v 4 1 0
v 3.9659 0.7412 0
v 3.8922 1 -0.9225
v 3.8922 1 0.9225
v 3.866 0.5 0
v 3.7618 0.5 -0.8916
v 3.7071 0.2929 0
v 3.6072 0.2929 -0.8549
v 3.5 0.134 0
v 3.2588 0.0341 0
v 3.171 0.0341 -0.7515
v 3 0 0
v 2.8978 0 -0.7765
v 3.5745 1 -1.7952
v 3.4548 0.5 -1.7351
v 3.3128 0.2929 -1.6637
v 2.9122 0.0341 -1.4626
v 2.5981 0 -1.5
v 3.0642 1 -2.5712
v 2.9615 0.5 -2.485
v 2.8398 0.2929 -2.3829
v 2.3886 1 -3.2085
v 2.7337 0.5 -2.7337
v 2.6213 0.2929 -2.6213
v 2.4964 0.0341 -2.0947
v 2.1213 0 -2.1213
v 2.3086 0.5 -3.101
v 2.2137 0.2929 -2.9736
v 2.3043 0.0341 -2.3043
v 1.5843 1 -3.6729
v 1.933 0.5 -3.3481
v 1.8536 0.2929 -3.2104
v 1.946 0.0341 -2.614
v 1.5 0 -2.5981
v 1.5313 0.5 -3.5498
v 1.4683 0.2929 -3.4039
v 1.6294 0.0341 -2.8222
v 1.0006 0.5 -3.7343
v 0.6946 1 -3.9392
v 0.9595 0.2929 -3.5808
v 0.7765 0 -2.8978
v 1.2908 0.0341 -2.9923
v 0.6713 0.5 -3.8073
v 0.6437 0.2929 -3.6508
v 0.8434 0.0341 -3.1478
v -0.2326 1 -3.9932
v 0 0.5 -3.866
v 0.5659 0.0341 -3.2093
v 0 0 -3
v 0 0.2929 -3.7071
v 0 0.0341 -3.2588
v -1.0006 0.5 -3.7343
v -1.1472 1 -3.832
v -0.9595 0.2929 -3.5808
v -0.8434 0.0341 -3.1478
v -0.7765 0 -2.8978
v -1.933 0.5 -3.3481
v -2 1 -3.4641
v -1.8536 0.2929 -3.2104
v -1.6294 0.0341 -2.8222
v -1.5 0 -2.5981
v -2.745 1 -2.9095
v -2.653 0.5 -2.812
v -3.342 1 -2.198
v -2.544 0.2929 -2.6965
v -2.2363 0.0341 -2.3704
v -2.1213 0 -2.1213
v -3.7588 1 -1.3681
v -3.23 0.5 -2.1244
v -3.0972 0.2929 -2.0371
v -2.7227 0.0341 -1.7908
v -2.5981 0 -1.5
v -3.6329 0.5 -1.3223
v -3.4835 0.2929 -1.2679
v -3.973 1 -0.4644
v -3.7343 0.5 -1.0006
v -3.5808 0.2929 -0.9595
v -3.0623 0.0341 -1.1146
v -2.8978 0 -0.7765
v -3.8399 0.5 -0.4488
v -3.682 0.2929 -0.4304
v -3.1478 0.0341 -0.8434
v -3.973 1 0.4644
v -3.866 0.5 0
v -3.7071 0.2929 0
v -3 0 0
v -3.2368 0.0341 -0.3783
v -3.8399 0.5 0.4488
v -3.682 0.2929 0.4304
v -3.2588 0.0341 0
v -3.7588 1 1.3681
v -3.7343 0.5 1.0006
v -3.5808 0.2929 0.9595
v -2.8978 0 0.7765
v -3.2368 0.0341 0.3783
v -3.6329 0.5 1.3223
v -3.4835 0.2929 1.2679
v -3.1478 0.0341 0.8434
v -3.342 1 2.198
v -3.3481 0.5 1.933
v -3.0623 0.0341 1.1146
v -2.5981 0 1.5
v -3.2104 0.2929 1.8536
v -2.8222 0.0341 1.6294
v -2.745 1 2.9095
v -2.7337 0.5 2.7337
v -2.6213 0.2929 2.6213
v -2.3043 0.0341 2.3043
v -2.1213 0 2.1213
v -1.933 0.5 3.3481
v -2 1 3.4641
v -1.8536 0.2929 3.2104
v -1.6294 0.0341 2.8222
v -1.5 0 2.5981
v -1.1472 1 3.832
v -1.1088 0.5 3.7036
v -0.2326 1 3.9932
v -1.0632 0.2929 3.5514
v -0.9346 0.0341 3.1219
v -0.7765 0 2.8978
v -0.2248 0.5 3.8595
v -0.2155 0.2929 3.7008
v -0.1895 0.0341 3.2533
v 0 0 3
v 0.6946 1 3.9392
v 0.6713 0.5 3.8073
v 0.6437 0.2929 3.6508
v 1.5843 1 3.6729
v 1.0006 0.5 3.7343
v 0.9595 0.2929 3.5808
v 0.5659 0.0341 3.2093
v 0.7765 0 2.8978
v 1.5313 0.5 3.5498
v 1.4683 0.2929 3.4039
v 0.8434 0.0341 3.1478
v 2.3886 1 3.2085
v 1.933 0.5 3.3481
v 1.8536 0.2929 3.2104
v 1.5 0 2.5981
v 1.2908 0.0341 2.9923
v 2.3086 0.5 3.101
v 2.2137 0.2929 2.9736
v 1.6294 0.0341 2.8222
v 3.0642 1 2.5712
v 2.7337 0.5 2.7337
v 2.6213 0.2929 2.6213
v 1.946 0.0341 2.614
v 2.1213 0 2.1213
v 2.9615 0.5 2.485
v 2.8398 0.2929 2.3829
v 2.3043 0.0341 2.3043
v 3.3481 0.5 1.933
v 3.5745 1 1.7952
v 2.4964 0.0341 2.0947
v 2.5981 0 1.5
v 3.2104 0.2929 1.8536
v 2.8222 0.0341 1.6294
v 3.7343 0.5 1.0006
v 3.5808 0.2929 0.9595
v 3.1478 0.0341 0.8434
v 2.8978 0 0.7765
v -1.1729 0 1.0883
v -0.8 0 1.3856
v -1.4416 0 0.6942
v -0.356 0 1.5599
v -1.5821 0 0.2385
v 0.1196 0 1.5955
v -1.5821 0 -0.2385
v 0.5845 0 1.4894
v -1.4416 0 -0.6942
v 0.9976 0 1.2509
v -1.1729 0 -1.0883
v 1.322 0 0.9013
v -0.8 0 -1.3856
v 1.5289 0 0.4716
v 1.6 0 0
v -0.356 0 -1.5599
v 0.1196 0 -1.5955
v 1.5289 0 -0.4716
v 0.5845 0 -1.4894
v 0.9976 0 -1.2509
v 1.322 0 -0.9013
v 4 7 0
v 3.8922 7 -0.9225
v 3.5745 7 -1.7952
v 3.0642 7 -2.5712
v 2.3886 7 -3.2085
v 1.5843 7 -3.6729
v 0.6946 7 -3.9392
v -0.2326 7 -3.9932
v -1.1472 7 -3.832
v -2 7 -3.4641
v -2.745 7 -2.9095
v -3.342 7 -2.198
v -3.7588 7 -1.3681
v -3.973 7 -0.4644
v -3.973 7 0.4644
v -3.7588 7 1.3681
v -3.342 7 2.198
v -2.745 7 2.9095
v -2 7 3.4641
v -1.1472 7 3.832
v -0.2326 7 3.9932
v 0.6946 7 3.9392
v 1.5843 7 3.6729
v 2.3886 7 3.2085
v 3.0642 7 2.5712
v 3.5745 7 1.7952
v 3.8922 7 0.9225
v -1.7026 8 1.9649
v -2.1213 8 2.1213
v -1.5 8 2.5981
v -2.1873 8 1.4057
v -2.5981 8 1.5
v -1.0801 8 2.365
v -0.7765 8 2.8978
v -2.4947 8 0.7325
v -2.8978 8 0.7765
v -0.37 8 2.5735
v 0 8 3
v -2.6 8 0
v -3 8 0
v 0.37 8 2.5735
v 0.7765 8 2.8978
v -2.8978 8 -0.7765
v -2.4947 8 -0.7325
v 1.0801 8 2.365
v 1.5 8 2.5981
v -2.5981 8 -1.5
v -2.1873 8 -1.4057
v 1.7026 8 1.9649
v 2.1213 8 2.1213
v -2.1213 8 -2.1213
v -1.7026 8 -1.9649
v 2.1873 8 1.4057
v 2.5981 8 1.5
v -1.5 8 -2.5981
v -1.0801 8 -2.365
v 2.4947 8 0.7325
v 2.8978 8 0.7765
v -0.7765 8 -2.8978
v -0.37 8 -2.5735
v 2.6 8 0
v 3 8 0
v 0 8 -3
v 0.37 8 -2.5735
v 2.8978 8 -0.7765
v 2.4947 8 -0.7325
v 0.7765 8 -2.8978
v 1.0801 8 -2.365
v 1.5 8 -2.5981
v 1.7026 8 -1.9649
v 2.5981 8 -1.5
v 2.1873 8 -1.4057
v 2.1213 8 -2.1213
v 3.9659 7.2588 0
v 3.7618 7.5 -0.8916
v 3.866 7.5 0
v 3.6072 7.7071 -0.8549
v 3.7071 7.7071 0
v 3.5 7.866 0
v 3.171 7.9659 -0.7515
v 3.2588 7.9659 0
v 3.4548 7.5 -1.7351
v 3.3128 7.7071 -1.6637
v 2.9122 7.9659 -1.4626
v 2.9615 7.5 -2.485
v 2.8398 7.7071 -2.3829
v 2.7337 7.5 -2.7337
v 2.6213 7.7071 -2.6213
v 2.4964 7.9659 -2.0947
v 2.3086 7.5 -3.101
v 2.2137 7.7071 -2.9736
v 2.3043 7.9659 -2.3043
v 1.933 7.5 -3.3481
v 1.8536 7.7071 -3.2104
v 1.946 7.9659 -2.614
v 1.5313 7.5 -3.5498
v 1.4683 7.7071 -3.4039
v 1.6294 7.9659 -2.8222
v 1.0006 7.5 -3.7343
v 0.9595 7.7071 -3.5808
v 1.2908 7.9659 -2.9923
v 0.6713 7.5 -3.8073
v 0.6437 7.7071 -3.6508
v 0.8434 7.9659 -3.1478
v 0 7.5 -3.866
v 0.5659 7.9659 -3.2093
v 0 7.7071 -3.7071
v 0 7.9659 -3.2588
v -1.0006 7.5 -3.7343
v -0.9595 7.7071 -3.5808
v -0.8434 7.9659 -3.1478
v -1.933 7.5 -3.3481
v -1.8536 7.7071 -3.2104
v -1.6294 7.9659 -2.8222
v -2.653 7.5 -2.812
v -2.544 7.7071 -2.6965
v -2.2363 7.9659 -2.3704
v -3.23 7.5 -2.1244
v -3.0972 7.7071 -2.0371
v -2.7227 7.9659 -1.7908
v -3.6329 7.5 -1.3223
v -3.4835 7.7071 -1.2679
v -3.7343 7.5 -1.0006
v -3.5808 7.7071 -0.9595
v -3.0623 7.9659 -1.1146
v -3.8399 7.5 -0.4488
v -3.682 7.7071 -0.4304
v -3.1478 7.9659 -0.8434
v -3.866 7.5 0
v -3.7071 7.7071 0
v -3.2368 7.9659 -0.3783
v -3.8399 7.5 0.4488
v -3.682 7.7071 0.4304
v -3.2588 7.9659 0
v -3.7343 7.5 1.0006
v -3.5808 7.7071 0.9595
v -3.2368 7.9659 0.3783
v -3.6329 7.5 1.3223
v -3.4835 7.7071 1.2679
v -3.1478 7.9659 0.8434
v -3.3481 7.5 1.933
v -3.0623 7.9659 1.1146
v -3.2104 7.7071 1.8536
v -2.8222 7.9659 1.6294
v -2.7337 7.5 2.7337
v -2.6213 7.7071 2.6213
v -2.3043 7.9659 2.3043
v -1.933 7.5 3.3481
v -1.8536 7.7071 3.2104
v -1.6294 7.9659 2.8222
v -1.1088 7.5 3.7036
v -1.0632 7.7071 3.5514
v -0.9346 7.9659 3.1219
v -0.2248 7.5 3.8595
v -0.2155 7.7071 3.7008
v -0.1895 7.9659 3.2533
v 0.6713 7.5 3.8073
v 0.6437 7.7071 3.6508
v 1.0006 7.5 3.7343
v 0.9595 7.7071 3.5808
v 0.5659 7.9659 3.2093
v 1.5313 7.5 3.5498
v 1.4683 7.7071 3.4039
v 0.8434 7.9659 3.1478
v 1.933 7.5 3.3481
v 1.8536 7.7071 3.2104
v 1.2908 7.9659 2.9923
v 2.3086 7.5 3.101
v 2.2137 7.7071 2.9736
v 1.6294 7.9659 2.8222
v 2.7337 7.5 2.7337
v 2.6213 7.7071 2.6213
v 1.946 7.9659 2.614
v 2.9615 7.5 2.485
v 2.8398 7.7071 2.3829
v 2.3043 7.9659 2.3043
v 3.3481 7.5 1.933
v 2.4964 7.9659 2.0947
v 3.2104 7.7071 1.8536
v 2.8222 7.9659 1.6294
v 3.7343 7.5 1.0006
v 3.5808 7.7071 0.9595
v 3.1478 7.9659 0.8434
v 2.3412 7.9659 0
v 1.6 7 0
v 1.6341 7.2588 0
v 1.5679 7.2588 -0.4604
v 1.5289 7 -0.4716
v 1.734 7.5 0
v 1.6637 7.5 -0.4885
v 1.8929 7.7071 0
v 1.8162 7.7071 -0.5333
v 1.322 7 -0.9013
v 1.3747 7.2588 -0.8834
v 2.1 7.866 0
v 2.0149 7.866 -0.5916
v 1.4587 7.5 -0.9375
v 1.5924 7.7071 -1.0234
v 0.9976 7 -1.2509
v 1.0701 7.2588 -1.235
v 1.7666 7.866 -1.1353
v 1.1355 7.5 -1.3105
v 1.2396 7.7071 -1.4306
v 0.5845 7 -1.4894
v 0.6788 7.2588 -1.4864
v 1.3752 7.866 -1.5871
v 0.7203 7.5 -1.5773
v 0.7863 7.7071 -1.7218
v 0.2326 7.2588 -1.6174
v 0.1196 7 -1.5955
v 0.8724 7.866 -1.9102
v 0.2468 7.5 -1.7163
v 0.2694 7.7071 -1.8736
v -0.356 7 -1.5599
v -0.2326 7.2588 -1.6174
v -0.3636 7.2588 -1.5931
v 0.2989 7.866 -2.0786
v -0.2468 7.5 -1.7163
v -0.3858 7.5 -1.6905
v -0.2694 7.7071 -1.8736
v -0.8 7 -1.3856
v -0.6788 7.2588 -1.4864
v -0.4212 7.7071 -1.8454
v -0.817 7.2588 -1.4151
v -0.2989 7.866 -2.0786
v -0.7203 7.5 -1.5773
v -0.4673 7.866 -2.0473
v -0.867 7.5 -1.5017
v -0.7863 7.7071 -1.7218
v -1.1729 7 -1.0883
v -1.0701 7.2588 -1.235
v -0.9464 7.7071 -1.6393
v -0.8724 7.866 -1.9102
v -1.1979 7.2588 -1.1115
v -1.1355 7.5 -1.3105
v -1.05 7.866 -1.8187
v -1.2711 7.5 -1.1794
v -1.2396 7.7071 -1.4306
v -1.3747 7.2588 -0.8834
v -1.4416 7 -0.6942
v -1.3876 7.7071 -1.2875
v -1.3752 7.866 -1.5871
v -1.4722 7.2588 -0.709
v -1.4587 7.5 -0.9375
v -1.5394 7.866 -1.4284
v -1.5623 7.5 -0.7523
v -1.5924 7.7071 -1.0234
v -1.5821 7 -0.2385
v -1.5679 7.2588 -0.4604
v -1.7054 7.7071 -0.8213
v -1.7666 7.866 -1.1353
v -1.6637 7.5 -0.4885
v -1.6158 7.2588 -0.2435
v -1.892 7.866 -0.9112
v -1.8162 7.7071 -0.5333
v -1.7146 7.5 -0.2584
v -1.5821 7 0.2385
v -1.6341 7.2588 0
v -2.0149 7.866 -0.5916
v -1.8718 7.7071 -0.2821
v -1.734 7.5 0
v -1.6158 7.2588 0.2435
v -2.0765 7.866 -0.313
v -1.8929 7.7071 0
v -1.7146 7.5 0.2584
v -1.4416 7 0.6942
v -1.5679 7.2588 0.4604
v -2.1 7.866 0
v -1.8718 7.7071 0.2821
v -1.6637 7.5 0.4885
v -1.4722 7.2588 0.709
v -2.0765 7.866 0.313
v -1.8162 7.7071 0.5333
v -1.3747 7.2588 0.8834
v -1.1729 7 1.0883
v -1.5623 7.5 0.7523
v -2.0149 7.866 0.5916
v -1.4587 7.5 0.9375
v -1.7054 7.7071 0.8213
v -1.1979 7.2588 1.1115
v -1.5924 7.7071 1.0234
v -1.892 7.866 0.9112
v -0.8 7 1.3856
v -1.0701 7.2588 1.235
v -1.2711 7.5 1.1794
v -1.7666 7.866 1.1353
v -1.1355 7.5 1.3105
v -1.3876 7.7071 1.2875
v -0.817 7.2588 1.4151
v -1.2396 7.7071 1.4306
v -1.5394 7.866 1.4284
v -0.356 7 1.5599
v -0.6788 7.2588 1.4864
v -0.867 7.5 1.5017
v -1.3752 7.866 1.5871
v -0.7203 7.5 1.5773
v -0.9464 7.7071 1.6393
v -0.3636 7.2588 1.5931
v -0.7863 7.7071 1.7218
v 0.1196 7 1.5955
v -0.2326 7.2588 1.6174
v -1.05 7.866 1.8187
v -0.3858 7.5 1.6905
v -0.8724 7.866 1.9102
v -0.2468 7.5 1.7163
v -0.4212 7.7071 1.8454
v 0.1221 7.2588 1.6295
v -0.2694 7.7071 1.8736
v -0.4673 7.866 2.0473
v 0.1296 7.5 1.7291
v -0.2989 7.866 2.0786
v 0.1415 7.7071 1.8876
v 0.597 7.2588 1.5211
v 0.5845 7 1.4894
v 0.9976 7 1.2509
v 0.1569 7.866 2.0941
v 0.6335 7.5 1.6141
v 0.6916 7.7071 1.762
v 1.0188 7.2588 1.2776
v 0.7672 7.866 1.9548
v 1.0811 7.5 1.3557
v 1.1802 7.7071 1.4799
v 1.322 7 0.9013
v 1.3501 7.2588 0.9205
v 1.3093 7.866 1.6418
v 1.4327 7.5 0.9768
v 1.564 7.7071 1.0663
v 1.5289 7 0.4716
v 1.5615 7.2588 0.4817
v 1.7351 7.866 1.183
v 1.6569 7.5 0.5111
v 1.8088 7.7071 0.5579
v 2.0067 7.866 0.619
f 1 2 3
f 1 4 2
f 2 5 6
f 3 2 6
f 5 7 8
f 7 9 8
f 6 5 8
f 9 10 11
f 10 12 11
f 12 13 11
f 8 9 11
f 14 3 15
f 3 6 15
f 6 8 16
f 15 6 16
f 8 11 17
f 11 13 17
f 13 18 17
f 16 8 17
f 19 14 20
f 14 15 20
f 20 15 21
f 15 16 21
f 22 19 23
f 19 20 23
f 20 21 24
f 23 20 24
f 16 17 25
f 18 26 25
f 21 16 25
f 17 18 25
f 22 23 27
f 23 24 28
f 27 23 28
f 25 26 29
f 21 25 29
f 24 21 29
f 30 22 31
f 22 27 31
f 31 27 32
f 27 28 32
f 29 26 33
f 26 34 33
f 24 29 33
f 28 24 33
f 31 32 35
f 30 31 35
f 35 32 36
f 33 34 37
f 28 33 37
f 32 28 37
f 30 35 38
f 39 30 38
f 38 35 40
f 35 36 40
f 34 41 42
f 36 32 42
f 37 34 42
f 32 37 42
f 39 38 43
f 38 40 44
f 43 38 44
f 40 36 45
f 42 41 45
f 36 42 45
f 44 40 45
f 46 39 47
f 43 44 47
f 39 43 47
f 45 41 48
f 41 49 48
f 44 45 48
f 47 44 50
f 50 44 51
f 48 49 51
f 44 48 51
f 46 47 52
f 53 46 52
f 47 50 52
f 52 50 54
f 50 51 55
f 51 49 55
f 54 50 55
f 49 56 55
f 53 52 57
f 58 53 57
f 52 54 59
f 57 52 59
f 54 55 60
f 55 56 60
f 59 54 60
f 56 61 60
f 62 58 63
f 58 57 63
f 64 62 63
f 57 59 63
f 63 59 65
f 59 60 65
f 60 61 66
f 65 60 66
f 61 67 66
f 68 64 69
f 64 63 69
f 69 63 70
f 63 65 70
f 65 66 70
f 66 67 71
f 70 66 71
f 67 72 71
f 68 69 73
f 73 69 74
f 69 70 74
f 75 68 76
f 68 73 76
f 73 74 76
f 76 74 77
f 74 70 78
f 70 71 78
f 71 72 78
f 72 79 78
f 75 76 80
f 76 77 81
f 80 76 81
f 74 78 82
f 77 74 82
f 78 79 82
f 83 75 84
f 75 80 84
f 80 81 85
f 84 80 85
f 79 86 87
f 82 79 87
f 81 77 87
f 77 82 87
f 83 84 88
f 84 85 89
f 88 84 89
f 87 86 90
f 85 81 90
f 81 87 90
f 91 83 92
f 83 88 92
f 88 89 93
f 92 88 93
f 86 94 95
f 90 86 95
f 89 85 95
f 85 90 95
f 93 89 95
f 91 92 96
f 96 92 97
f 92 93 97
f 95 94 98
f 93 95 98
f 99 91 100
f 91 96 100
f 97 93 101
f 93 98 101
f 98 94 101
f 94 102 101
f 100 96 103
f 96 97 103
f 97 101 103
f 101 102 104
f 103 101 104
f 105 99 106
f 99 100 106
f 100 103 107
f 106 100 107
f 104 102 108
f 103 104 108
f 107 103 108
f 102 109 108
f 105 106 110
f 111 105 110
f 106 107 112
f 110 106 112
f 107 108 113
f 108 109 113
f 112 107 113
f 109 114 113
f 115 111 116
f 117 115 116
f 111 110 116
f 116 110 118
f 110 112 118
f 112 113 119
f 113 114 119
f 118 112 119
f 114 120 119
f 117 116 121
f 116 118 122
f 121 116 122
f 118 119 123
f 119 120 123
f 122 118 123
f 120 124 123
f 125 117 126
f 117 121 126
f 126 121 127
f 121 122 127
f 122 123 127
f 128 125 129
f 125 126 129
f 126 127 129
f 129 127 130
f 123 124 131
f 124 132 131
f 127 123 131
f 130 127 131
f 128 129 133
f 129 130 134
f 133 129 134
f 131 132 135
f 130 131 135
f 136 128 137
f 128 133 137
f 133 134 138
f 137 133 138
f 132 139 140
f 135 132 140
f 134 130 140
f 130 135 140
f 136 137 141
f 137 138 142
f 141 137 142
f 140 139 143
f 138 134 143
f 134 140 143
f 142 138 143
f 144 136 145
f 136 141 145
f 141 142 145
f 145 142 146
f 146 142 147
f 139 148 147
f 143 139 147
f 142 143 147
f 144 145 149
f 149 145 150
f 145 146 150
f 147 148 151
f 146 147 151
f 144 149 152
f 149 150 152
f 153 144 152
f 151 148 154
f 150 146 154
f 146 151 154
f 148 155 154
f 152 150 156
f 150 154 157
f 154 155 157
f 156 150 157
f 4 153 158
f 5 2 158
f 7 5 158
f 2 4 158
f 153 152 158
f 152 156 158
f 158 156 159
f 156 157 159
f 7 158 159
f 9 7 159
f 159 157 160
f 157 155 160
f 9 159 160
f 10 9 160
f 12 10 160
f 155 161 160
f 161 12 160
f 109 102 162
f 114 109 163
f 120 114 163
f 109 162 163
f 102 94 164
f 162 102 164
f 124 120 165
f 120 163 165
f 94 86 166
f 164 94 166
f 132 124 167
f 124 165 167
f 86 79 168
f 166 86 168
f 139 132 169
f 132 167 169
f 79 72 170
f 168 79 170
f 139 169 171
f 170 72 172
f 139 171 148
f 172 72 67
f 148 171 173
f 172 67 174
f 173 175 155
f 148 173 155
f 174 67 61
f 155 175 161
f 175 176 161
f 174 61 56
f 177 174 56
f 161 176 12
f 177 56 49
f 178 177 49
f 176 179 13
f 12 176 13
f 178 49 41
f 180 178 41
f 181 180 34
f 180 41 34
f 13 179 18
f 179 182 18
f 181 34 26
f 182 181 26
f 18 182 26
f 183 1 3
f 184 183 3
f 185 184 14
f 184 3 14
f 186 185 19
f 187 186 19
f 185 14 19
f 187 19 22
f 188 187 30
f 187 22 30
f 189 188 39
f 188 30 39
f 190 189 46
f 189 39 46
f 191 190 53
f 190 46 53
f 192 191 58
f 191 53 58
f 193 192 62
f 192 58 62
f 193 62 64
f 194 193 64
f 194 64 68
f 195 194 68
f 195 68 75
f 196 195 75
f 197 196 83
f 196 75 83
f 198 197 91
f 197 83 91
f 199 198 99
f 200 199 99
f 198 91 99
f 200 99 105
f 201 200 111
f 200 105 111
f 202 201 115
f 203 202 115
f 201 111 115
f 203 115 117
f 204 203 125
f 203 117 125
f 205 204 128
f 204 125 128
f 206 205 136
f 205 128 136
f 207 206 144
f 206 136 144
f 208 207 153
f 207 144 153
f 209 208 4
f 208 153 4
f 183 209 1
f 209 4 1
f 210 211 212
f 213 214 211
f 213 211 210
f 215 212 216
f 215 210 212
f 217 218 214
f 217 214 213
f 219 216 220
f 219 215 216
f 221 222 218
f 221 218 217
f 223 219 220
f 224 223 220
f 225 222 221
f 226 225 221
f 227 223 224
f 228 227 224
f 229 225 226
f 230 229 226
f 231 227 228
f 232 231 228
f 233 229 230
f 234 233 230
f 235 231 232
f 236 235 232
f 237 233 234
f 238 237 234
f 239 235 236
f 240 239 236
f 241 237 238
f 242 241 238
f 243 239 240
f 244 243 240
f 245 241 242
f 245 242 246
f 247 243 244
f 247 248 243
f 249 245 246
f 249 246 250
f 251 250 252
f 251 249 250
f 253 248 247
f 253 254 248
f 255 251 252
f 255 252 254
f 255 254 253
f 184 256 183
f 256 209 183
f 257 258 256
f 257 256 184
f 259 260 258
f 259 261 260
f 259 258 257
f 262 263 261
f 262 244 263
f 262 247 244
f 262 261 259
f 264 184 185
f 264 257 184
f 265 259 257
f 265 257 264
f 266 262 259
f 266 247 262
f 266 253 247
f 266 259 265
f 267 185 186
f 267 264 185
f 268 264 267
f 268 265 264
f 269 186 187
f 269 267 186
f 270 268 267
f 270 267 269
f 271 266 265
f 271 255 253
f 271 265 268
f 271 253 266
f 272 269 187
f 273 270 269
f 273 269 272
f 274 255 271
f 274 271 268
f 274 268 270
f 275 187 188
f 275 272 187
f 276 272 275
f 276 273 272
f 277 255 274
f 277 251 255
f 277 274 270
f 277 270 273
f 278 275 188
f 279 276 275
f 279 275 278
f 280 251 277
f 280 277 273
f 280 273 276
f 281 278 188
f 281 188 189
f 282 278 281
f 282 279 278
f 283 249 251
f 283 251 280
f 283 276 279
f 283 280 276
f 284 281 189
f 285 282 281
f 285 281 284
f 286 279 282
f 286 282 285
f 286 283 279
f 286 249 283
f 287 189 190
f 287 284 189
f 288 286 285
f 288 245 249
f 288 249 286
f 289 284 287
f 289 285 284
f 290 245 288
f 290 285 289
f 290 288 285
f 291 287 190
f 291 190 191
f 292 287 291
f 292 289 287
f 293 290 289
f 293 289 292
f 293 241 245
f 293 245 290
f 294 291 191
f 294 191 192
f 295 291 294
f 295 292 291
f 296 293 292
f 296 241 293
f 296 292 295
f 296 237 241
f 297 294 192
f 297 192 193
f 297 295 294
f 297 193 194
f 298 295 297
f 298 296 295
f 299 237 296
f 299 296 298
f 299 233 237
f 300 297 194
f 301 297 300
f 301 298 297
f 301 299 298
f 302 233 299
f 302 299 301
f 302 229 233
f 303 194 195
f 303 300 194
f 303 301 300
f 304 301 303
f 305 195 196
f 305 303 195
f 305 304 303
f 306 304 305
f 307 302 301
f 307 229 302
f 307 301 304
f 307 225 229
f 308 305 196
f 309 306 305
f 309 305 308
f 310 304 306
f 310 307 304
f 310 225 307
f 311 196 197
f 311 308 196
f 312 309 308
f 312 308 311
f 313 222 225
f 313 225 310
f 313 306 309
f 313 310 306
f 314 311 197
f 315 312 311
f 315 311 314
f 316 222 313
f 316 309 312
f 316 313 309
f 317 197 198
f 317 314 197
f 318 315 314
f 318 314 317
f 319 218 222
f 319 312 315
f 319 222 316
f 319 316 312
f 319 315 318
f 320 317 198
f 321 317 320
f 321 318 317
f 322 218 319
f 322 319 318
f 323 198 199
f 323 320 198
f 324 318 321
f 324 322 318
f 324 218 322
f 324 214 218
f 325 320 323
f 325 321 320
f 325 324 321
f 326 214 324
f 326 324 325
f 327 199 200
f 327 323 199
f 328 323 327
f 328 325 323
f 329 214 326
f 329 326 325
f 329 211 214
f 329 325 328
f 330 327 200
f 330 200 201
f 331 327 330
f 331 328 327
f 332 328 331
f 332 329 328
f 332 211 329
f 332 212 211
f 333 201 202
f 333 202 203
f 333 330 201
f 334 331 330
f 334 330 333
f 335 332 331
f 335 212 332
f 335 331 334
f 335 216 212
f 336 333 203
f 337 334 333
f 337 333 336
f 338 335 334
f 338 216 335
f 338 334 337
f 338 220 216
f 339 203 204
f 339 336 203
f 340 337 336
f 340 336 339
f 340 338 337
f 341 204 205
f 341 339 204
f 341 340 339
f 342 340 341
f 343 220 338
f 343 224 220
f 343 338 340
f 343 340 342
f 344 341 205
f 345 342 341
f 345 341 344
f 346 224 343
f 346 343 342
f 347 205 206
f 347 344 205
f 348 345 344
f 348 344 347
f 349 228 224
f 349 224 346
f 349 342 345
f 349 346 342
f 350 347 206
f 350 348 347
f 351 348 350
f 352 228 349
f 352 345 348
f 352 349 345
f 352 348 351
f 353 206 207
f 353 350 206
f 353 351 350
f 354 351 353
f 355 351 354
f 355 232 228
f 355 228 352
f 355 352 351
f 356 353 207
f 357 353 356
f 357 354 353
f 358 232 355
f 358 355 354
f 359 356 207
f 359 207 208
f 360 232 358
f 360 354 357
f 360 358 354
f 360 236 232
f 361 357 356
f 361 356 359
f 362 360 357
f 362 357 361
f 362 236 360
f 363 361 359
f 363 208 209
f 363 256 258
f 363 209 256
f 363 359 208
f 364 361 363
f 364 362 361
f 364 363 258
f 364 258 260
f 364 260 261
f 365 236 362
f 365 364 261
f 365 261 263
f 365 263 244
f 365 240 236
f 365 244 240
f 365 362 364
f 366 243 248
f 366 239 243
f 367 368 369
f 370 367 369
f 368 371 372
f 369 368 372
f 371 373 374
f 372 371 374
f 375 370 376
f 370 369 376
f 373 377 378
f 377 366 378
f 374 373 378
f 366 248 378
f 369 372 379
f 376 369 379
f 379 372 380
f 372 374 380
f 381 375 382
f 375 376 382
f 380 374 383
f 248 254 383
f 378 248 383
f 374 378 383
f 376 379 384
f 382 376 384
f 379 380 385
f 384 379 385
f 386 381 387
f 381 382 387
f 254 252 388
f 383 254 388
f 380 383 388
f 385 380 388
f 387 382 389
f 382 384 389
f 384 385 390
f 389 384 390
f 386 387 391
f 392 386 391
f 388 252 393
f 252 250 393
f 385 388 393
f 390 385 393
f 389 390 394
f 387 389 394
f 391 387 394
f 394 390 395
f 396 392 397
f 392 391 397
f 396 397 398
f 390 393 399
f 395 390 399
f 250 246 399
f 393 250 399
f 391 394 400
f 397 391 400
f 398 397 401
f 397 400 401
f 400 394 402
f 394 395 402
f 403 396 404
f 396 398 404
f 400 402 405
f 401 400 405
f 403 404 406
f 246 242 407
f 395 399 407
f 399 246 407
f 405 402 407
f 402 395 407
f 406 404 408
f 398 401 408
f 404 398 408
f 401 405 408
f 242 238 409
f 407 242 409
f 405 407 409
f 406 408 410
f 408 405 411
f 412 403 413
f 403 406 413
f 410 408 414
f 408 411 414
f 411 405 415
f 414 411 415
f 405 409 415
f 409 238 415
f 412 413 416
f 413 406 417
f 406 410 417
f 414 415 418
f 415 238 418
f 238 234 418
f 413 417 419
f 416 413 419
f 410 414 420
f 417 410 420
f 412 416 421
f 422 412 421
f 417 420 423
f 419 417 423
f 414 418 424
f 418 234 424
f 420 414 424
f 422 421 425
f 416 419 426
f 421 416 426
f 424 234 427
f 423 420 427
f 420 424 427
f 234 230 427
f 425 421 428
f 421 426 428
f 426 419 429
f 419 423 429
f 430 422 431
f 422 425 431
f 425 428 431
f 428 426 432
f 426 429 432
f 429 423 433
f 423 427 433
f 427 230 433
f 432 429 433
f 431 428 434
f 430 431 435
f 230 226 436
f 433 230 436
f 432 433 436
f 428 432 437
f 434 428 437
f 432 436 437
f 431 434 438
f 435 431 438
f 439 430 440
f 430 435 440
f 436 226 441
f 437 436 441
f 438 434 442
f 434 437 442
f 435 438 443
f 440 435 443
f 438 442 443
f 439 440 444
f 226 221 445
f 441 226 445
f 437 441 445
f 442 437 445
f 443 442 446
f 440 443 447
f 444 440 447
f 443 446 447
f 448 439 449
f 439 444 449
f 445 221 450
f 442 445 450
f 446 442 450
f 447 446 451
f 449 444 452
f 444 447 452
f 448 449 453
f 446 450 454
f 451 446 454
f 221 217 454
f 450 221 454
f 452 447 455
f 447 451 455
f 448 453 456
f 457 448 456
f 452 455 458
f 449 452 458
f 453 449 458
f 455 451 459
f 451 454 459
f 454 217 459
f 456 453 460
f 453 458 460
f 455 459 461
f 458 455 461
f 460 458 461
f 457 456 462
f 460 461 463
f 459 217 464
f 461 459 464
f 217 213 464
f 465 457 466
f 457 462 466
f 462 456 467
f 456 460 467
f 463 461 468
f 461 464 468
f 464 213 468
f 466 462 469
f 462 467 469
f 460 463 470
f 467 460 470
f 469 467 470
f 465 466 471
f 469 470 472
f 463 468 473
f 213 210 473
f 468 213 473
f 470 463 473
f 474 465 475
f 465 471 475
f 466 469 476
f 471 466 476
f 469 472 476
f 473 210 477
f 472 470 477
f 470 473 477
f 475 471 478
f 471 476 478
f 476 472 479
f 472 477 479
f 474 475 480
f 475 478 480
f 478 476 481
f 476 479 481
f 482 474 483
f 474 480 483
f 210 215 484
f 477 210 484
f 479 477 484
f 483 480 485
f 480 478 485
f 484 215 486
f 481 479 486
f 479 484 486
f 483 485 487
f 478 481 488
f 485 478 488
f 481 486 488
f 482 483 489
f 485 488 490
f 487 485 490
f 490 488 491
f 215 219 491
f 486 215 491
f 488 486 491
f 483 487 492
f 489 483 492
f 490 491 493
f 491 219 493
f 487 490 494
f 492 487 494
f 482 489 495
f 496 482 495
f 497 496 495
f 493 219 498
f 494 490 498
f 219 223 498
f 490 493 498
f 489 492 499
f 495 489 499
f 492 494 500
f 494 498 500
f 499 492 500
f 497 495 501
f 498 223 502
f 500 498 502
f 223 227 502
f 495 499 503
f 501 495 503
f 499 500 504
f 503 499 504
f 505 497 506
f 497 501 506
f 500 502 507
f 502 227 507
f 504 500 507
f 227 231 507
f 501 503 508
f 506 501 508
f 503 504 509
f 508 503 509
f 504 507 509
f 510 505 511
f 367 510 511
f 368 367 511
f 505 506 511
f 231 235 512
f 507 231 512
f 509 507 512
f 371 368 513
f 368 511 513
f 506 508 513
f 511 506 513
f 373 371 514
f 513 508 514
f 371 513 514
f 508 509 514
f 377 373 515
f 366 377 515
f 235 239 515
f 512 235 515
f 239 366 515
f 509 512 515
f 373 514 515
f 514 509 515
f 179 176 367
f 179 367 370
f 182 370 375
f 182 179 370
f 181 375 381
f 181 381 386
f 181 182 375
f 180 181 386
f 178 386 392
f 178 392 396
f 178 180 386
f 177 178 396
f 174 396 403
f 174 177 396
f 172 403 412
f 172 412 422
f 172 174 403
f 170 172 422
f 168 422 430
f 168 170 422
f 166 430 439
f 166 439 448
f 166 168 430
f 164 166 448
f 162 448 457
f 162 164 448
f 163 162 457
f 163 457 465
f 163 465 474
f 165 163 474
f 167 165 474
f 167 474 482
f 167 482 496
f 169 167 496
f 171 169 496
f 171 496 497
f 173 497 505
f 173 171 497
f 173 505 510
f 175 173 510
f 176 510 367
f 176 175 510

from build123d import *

# Parameters (mm, degrees)
SKETCH1_R           = 4
SKETCH1_R_2         = 1.6
BOSS_EXTRUDE1_DEPTH = 8
FILLET1_R           = 1


with BuildPart() as part:
    # Sketch1 → Boss-Extrude1 (new body)
    with BuildSketch(Plane(origin=(0, 0, 0), x_dir=(1, 0, 0), z_dir=(0, 1, 0))):
        Circle(SKETCH1_R)
        Circle(SKETCH1_R_2, mode=Mode.SUBTRACT)
    extrude(amount=BOSS_EXTRUDE1_DEPTH)

    # Fillet1
    fillet1_edges = [part.edges().sort_by_distance(p)[0] for p in [
        (-4, 0, 0),
        (-4, 8, 0),
        (-1.6, 8, 0),
    ]]
    fillet(fillet1_edges, radius=FILLET1_R)


solid = part.part
